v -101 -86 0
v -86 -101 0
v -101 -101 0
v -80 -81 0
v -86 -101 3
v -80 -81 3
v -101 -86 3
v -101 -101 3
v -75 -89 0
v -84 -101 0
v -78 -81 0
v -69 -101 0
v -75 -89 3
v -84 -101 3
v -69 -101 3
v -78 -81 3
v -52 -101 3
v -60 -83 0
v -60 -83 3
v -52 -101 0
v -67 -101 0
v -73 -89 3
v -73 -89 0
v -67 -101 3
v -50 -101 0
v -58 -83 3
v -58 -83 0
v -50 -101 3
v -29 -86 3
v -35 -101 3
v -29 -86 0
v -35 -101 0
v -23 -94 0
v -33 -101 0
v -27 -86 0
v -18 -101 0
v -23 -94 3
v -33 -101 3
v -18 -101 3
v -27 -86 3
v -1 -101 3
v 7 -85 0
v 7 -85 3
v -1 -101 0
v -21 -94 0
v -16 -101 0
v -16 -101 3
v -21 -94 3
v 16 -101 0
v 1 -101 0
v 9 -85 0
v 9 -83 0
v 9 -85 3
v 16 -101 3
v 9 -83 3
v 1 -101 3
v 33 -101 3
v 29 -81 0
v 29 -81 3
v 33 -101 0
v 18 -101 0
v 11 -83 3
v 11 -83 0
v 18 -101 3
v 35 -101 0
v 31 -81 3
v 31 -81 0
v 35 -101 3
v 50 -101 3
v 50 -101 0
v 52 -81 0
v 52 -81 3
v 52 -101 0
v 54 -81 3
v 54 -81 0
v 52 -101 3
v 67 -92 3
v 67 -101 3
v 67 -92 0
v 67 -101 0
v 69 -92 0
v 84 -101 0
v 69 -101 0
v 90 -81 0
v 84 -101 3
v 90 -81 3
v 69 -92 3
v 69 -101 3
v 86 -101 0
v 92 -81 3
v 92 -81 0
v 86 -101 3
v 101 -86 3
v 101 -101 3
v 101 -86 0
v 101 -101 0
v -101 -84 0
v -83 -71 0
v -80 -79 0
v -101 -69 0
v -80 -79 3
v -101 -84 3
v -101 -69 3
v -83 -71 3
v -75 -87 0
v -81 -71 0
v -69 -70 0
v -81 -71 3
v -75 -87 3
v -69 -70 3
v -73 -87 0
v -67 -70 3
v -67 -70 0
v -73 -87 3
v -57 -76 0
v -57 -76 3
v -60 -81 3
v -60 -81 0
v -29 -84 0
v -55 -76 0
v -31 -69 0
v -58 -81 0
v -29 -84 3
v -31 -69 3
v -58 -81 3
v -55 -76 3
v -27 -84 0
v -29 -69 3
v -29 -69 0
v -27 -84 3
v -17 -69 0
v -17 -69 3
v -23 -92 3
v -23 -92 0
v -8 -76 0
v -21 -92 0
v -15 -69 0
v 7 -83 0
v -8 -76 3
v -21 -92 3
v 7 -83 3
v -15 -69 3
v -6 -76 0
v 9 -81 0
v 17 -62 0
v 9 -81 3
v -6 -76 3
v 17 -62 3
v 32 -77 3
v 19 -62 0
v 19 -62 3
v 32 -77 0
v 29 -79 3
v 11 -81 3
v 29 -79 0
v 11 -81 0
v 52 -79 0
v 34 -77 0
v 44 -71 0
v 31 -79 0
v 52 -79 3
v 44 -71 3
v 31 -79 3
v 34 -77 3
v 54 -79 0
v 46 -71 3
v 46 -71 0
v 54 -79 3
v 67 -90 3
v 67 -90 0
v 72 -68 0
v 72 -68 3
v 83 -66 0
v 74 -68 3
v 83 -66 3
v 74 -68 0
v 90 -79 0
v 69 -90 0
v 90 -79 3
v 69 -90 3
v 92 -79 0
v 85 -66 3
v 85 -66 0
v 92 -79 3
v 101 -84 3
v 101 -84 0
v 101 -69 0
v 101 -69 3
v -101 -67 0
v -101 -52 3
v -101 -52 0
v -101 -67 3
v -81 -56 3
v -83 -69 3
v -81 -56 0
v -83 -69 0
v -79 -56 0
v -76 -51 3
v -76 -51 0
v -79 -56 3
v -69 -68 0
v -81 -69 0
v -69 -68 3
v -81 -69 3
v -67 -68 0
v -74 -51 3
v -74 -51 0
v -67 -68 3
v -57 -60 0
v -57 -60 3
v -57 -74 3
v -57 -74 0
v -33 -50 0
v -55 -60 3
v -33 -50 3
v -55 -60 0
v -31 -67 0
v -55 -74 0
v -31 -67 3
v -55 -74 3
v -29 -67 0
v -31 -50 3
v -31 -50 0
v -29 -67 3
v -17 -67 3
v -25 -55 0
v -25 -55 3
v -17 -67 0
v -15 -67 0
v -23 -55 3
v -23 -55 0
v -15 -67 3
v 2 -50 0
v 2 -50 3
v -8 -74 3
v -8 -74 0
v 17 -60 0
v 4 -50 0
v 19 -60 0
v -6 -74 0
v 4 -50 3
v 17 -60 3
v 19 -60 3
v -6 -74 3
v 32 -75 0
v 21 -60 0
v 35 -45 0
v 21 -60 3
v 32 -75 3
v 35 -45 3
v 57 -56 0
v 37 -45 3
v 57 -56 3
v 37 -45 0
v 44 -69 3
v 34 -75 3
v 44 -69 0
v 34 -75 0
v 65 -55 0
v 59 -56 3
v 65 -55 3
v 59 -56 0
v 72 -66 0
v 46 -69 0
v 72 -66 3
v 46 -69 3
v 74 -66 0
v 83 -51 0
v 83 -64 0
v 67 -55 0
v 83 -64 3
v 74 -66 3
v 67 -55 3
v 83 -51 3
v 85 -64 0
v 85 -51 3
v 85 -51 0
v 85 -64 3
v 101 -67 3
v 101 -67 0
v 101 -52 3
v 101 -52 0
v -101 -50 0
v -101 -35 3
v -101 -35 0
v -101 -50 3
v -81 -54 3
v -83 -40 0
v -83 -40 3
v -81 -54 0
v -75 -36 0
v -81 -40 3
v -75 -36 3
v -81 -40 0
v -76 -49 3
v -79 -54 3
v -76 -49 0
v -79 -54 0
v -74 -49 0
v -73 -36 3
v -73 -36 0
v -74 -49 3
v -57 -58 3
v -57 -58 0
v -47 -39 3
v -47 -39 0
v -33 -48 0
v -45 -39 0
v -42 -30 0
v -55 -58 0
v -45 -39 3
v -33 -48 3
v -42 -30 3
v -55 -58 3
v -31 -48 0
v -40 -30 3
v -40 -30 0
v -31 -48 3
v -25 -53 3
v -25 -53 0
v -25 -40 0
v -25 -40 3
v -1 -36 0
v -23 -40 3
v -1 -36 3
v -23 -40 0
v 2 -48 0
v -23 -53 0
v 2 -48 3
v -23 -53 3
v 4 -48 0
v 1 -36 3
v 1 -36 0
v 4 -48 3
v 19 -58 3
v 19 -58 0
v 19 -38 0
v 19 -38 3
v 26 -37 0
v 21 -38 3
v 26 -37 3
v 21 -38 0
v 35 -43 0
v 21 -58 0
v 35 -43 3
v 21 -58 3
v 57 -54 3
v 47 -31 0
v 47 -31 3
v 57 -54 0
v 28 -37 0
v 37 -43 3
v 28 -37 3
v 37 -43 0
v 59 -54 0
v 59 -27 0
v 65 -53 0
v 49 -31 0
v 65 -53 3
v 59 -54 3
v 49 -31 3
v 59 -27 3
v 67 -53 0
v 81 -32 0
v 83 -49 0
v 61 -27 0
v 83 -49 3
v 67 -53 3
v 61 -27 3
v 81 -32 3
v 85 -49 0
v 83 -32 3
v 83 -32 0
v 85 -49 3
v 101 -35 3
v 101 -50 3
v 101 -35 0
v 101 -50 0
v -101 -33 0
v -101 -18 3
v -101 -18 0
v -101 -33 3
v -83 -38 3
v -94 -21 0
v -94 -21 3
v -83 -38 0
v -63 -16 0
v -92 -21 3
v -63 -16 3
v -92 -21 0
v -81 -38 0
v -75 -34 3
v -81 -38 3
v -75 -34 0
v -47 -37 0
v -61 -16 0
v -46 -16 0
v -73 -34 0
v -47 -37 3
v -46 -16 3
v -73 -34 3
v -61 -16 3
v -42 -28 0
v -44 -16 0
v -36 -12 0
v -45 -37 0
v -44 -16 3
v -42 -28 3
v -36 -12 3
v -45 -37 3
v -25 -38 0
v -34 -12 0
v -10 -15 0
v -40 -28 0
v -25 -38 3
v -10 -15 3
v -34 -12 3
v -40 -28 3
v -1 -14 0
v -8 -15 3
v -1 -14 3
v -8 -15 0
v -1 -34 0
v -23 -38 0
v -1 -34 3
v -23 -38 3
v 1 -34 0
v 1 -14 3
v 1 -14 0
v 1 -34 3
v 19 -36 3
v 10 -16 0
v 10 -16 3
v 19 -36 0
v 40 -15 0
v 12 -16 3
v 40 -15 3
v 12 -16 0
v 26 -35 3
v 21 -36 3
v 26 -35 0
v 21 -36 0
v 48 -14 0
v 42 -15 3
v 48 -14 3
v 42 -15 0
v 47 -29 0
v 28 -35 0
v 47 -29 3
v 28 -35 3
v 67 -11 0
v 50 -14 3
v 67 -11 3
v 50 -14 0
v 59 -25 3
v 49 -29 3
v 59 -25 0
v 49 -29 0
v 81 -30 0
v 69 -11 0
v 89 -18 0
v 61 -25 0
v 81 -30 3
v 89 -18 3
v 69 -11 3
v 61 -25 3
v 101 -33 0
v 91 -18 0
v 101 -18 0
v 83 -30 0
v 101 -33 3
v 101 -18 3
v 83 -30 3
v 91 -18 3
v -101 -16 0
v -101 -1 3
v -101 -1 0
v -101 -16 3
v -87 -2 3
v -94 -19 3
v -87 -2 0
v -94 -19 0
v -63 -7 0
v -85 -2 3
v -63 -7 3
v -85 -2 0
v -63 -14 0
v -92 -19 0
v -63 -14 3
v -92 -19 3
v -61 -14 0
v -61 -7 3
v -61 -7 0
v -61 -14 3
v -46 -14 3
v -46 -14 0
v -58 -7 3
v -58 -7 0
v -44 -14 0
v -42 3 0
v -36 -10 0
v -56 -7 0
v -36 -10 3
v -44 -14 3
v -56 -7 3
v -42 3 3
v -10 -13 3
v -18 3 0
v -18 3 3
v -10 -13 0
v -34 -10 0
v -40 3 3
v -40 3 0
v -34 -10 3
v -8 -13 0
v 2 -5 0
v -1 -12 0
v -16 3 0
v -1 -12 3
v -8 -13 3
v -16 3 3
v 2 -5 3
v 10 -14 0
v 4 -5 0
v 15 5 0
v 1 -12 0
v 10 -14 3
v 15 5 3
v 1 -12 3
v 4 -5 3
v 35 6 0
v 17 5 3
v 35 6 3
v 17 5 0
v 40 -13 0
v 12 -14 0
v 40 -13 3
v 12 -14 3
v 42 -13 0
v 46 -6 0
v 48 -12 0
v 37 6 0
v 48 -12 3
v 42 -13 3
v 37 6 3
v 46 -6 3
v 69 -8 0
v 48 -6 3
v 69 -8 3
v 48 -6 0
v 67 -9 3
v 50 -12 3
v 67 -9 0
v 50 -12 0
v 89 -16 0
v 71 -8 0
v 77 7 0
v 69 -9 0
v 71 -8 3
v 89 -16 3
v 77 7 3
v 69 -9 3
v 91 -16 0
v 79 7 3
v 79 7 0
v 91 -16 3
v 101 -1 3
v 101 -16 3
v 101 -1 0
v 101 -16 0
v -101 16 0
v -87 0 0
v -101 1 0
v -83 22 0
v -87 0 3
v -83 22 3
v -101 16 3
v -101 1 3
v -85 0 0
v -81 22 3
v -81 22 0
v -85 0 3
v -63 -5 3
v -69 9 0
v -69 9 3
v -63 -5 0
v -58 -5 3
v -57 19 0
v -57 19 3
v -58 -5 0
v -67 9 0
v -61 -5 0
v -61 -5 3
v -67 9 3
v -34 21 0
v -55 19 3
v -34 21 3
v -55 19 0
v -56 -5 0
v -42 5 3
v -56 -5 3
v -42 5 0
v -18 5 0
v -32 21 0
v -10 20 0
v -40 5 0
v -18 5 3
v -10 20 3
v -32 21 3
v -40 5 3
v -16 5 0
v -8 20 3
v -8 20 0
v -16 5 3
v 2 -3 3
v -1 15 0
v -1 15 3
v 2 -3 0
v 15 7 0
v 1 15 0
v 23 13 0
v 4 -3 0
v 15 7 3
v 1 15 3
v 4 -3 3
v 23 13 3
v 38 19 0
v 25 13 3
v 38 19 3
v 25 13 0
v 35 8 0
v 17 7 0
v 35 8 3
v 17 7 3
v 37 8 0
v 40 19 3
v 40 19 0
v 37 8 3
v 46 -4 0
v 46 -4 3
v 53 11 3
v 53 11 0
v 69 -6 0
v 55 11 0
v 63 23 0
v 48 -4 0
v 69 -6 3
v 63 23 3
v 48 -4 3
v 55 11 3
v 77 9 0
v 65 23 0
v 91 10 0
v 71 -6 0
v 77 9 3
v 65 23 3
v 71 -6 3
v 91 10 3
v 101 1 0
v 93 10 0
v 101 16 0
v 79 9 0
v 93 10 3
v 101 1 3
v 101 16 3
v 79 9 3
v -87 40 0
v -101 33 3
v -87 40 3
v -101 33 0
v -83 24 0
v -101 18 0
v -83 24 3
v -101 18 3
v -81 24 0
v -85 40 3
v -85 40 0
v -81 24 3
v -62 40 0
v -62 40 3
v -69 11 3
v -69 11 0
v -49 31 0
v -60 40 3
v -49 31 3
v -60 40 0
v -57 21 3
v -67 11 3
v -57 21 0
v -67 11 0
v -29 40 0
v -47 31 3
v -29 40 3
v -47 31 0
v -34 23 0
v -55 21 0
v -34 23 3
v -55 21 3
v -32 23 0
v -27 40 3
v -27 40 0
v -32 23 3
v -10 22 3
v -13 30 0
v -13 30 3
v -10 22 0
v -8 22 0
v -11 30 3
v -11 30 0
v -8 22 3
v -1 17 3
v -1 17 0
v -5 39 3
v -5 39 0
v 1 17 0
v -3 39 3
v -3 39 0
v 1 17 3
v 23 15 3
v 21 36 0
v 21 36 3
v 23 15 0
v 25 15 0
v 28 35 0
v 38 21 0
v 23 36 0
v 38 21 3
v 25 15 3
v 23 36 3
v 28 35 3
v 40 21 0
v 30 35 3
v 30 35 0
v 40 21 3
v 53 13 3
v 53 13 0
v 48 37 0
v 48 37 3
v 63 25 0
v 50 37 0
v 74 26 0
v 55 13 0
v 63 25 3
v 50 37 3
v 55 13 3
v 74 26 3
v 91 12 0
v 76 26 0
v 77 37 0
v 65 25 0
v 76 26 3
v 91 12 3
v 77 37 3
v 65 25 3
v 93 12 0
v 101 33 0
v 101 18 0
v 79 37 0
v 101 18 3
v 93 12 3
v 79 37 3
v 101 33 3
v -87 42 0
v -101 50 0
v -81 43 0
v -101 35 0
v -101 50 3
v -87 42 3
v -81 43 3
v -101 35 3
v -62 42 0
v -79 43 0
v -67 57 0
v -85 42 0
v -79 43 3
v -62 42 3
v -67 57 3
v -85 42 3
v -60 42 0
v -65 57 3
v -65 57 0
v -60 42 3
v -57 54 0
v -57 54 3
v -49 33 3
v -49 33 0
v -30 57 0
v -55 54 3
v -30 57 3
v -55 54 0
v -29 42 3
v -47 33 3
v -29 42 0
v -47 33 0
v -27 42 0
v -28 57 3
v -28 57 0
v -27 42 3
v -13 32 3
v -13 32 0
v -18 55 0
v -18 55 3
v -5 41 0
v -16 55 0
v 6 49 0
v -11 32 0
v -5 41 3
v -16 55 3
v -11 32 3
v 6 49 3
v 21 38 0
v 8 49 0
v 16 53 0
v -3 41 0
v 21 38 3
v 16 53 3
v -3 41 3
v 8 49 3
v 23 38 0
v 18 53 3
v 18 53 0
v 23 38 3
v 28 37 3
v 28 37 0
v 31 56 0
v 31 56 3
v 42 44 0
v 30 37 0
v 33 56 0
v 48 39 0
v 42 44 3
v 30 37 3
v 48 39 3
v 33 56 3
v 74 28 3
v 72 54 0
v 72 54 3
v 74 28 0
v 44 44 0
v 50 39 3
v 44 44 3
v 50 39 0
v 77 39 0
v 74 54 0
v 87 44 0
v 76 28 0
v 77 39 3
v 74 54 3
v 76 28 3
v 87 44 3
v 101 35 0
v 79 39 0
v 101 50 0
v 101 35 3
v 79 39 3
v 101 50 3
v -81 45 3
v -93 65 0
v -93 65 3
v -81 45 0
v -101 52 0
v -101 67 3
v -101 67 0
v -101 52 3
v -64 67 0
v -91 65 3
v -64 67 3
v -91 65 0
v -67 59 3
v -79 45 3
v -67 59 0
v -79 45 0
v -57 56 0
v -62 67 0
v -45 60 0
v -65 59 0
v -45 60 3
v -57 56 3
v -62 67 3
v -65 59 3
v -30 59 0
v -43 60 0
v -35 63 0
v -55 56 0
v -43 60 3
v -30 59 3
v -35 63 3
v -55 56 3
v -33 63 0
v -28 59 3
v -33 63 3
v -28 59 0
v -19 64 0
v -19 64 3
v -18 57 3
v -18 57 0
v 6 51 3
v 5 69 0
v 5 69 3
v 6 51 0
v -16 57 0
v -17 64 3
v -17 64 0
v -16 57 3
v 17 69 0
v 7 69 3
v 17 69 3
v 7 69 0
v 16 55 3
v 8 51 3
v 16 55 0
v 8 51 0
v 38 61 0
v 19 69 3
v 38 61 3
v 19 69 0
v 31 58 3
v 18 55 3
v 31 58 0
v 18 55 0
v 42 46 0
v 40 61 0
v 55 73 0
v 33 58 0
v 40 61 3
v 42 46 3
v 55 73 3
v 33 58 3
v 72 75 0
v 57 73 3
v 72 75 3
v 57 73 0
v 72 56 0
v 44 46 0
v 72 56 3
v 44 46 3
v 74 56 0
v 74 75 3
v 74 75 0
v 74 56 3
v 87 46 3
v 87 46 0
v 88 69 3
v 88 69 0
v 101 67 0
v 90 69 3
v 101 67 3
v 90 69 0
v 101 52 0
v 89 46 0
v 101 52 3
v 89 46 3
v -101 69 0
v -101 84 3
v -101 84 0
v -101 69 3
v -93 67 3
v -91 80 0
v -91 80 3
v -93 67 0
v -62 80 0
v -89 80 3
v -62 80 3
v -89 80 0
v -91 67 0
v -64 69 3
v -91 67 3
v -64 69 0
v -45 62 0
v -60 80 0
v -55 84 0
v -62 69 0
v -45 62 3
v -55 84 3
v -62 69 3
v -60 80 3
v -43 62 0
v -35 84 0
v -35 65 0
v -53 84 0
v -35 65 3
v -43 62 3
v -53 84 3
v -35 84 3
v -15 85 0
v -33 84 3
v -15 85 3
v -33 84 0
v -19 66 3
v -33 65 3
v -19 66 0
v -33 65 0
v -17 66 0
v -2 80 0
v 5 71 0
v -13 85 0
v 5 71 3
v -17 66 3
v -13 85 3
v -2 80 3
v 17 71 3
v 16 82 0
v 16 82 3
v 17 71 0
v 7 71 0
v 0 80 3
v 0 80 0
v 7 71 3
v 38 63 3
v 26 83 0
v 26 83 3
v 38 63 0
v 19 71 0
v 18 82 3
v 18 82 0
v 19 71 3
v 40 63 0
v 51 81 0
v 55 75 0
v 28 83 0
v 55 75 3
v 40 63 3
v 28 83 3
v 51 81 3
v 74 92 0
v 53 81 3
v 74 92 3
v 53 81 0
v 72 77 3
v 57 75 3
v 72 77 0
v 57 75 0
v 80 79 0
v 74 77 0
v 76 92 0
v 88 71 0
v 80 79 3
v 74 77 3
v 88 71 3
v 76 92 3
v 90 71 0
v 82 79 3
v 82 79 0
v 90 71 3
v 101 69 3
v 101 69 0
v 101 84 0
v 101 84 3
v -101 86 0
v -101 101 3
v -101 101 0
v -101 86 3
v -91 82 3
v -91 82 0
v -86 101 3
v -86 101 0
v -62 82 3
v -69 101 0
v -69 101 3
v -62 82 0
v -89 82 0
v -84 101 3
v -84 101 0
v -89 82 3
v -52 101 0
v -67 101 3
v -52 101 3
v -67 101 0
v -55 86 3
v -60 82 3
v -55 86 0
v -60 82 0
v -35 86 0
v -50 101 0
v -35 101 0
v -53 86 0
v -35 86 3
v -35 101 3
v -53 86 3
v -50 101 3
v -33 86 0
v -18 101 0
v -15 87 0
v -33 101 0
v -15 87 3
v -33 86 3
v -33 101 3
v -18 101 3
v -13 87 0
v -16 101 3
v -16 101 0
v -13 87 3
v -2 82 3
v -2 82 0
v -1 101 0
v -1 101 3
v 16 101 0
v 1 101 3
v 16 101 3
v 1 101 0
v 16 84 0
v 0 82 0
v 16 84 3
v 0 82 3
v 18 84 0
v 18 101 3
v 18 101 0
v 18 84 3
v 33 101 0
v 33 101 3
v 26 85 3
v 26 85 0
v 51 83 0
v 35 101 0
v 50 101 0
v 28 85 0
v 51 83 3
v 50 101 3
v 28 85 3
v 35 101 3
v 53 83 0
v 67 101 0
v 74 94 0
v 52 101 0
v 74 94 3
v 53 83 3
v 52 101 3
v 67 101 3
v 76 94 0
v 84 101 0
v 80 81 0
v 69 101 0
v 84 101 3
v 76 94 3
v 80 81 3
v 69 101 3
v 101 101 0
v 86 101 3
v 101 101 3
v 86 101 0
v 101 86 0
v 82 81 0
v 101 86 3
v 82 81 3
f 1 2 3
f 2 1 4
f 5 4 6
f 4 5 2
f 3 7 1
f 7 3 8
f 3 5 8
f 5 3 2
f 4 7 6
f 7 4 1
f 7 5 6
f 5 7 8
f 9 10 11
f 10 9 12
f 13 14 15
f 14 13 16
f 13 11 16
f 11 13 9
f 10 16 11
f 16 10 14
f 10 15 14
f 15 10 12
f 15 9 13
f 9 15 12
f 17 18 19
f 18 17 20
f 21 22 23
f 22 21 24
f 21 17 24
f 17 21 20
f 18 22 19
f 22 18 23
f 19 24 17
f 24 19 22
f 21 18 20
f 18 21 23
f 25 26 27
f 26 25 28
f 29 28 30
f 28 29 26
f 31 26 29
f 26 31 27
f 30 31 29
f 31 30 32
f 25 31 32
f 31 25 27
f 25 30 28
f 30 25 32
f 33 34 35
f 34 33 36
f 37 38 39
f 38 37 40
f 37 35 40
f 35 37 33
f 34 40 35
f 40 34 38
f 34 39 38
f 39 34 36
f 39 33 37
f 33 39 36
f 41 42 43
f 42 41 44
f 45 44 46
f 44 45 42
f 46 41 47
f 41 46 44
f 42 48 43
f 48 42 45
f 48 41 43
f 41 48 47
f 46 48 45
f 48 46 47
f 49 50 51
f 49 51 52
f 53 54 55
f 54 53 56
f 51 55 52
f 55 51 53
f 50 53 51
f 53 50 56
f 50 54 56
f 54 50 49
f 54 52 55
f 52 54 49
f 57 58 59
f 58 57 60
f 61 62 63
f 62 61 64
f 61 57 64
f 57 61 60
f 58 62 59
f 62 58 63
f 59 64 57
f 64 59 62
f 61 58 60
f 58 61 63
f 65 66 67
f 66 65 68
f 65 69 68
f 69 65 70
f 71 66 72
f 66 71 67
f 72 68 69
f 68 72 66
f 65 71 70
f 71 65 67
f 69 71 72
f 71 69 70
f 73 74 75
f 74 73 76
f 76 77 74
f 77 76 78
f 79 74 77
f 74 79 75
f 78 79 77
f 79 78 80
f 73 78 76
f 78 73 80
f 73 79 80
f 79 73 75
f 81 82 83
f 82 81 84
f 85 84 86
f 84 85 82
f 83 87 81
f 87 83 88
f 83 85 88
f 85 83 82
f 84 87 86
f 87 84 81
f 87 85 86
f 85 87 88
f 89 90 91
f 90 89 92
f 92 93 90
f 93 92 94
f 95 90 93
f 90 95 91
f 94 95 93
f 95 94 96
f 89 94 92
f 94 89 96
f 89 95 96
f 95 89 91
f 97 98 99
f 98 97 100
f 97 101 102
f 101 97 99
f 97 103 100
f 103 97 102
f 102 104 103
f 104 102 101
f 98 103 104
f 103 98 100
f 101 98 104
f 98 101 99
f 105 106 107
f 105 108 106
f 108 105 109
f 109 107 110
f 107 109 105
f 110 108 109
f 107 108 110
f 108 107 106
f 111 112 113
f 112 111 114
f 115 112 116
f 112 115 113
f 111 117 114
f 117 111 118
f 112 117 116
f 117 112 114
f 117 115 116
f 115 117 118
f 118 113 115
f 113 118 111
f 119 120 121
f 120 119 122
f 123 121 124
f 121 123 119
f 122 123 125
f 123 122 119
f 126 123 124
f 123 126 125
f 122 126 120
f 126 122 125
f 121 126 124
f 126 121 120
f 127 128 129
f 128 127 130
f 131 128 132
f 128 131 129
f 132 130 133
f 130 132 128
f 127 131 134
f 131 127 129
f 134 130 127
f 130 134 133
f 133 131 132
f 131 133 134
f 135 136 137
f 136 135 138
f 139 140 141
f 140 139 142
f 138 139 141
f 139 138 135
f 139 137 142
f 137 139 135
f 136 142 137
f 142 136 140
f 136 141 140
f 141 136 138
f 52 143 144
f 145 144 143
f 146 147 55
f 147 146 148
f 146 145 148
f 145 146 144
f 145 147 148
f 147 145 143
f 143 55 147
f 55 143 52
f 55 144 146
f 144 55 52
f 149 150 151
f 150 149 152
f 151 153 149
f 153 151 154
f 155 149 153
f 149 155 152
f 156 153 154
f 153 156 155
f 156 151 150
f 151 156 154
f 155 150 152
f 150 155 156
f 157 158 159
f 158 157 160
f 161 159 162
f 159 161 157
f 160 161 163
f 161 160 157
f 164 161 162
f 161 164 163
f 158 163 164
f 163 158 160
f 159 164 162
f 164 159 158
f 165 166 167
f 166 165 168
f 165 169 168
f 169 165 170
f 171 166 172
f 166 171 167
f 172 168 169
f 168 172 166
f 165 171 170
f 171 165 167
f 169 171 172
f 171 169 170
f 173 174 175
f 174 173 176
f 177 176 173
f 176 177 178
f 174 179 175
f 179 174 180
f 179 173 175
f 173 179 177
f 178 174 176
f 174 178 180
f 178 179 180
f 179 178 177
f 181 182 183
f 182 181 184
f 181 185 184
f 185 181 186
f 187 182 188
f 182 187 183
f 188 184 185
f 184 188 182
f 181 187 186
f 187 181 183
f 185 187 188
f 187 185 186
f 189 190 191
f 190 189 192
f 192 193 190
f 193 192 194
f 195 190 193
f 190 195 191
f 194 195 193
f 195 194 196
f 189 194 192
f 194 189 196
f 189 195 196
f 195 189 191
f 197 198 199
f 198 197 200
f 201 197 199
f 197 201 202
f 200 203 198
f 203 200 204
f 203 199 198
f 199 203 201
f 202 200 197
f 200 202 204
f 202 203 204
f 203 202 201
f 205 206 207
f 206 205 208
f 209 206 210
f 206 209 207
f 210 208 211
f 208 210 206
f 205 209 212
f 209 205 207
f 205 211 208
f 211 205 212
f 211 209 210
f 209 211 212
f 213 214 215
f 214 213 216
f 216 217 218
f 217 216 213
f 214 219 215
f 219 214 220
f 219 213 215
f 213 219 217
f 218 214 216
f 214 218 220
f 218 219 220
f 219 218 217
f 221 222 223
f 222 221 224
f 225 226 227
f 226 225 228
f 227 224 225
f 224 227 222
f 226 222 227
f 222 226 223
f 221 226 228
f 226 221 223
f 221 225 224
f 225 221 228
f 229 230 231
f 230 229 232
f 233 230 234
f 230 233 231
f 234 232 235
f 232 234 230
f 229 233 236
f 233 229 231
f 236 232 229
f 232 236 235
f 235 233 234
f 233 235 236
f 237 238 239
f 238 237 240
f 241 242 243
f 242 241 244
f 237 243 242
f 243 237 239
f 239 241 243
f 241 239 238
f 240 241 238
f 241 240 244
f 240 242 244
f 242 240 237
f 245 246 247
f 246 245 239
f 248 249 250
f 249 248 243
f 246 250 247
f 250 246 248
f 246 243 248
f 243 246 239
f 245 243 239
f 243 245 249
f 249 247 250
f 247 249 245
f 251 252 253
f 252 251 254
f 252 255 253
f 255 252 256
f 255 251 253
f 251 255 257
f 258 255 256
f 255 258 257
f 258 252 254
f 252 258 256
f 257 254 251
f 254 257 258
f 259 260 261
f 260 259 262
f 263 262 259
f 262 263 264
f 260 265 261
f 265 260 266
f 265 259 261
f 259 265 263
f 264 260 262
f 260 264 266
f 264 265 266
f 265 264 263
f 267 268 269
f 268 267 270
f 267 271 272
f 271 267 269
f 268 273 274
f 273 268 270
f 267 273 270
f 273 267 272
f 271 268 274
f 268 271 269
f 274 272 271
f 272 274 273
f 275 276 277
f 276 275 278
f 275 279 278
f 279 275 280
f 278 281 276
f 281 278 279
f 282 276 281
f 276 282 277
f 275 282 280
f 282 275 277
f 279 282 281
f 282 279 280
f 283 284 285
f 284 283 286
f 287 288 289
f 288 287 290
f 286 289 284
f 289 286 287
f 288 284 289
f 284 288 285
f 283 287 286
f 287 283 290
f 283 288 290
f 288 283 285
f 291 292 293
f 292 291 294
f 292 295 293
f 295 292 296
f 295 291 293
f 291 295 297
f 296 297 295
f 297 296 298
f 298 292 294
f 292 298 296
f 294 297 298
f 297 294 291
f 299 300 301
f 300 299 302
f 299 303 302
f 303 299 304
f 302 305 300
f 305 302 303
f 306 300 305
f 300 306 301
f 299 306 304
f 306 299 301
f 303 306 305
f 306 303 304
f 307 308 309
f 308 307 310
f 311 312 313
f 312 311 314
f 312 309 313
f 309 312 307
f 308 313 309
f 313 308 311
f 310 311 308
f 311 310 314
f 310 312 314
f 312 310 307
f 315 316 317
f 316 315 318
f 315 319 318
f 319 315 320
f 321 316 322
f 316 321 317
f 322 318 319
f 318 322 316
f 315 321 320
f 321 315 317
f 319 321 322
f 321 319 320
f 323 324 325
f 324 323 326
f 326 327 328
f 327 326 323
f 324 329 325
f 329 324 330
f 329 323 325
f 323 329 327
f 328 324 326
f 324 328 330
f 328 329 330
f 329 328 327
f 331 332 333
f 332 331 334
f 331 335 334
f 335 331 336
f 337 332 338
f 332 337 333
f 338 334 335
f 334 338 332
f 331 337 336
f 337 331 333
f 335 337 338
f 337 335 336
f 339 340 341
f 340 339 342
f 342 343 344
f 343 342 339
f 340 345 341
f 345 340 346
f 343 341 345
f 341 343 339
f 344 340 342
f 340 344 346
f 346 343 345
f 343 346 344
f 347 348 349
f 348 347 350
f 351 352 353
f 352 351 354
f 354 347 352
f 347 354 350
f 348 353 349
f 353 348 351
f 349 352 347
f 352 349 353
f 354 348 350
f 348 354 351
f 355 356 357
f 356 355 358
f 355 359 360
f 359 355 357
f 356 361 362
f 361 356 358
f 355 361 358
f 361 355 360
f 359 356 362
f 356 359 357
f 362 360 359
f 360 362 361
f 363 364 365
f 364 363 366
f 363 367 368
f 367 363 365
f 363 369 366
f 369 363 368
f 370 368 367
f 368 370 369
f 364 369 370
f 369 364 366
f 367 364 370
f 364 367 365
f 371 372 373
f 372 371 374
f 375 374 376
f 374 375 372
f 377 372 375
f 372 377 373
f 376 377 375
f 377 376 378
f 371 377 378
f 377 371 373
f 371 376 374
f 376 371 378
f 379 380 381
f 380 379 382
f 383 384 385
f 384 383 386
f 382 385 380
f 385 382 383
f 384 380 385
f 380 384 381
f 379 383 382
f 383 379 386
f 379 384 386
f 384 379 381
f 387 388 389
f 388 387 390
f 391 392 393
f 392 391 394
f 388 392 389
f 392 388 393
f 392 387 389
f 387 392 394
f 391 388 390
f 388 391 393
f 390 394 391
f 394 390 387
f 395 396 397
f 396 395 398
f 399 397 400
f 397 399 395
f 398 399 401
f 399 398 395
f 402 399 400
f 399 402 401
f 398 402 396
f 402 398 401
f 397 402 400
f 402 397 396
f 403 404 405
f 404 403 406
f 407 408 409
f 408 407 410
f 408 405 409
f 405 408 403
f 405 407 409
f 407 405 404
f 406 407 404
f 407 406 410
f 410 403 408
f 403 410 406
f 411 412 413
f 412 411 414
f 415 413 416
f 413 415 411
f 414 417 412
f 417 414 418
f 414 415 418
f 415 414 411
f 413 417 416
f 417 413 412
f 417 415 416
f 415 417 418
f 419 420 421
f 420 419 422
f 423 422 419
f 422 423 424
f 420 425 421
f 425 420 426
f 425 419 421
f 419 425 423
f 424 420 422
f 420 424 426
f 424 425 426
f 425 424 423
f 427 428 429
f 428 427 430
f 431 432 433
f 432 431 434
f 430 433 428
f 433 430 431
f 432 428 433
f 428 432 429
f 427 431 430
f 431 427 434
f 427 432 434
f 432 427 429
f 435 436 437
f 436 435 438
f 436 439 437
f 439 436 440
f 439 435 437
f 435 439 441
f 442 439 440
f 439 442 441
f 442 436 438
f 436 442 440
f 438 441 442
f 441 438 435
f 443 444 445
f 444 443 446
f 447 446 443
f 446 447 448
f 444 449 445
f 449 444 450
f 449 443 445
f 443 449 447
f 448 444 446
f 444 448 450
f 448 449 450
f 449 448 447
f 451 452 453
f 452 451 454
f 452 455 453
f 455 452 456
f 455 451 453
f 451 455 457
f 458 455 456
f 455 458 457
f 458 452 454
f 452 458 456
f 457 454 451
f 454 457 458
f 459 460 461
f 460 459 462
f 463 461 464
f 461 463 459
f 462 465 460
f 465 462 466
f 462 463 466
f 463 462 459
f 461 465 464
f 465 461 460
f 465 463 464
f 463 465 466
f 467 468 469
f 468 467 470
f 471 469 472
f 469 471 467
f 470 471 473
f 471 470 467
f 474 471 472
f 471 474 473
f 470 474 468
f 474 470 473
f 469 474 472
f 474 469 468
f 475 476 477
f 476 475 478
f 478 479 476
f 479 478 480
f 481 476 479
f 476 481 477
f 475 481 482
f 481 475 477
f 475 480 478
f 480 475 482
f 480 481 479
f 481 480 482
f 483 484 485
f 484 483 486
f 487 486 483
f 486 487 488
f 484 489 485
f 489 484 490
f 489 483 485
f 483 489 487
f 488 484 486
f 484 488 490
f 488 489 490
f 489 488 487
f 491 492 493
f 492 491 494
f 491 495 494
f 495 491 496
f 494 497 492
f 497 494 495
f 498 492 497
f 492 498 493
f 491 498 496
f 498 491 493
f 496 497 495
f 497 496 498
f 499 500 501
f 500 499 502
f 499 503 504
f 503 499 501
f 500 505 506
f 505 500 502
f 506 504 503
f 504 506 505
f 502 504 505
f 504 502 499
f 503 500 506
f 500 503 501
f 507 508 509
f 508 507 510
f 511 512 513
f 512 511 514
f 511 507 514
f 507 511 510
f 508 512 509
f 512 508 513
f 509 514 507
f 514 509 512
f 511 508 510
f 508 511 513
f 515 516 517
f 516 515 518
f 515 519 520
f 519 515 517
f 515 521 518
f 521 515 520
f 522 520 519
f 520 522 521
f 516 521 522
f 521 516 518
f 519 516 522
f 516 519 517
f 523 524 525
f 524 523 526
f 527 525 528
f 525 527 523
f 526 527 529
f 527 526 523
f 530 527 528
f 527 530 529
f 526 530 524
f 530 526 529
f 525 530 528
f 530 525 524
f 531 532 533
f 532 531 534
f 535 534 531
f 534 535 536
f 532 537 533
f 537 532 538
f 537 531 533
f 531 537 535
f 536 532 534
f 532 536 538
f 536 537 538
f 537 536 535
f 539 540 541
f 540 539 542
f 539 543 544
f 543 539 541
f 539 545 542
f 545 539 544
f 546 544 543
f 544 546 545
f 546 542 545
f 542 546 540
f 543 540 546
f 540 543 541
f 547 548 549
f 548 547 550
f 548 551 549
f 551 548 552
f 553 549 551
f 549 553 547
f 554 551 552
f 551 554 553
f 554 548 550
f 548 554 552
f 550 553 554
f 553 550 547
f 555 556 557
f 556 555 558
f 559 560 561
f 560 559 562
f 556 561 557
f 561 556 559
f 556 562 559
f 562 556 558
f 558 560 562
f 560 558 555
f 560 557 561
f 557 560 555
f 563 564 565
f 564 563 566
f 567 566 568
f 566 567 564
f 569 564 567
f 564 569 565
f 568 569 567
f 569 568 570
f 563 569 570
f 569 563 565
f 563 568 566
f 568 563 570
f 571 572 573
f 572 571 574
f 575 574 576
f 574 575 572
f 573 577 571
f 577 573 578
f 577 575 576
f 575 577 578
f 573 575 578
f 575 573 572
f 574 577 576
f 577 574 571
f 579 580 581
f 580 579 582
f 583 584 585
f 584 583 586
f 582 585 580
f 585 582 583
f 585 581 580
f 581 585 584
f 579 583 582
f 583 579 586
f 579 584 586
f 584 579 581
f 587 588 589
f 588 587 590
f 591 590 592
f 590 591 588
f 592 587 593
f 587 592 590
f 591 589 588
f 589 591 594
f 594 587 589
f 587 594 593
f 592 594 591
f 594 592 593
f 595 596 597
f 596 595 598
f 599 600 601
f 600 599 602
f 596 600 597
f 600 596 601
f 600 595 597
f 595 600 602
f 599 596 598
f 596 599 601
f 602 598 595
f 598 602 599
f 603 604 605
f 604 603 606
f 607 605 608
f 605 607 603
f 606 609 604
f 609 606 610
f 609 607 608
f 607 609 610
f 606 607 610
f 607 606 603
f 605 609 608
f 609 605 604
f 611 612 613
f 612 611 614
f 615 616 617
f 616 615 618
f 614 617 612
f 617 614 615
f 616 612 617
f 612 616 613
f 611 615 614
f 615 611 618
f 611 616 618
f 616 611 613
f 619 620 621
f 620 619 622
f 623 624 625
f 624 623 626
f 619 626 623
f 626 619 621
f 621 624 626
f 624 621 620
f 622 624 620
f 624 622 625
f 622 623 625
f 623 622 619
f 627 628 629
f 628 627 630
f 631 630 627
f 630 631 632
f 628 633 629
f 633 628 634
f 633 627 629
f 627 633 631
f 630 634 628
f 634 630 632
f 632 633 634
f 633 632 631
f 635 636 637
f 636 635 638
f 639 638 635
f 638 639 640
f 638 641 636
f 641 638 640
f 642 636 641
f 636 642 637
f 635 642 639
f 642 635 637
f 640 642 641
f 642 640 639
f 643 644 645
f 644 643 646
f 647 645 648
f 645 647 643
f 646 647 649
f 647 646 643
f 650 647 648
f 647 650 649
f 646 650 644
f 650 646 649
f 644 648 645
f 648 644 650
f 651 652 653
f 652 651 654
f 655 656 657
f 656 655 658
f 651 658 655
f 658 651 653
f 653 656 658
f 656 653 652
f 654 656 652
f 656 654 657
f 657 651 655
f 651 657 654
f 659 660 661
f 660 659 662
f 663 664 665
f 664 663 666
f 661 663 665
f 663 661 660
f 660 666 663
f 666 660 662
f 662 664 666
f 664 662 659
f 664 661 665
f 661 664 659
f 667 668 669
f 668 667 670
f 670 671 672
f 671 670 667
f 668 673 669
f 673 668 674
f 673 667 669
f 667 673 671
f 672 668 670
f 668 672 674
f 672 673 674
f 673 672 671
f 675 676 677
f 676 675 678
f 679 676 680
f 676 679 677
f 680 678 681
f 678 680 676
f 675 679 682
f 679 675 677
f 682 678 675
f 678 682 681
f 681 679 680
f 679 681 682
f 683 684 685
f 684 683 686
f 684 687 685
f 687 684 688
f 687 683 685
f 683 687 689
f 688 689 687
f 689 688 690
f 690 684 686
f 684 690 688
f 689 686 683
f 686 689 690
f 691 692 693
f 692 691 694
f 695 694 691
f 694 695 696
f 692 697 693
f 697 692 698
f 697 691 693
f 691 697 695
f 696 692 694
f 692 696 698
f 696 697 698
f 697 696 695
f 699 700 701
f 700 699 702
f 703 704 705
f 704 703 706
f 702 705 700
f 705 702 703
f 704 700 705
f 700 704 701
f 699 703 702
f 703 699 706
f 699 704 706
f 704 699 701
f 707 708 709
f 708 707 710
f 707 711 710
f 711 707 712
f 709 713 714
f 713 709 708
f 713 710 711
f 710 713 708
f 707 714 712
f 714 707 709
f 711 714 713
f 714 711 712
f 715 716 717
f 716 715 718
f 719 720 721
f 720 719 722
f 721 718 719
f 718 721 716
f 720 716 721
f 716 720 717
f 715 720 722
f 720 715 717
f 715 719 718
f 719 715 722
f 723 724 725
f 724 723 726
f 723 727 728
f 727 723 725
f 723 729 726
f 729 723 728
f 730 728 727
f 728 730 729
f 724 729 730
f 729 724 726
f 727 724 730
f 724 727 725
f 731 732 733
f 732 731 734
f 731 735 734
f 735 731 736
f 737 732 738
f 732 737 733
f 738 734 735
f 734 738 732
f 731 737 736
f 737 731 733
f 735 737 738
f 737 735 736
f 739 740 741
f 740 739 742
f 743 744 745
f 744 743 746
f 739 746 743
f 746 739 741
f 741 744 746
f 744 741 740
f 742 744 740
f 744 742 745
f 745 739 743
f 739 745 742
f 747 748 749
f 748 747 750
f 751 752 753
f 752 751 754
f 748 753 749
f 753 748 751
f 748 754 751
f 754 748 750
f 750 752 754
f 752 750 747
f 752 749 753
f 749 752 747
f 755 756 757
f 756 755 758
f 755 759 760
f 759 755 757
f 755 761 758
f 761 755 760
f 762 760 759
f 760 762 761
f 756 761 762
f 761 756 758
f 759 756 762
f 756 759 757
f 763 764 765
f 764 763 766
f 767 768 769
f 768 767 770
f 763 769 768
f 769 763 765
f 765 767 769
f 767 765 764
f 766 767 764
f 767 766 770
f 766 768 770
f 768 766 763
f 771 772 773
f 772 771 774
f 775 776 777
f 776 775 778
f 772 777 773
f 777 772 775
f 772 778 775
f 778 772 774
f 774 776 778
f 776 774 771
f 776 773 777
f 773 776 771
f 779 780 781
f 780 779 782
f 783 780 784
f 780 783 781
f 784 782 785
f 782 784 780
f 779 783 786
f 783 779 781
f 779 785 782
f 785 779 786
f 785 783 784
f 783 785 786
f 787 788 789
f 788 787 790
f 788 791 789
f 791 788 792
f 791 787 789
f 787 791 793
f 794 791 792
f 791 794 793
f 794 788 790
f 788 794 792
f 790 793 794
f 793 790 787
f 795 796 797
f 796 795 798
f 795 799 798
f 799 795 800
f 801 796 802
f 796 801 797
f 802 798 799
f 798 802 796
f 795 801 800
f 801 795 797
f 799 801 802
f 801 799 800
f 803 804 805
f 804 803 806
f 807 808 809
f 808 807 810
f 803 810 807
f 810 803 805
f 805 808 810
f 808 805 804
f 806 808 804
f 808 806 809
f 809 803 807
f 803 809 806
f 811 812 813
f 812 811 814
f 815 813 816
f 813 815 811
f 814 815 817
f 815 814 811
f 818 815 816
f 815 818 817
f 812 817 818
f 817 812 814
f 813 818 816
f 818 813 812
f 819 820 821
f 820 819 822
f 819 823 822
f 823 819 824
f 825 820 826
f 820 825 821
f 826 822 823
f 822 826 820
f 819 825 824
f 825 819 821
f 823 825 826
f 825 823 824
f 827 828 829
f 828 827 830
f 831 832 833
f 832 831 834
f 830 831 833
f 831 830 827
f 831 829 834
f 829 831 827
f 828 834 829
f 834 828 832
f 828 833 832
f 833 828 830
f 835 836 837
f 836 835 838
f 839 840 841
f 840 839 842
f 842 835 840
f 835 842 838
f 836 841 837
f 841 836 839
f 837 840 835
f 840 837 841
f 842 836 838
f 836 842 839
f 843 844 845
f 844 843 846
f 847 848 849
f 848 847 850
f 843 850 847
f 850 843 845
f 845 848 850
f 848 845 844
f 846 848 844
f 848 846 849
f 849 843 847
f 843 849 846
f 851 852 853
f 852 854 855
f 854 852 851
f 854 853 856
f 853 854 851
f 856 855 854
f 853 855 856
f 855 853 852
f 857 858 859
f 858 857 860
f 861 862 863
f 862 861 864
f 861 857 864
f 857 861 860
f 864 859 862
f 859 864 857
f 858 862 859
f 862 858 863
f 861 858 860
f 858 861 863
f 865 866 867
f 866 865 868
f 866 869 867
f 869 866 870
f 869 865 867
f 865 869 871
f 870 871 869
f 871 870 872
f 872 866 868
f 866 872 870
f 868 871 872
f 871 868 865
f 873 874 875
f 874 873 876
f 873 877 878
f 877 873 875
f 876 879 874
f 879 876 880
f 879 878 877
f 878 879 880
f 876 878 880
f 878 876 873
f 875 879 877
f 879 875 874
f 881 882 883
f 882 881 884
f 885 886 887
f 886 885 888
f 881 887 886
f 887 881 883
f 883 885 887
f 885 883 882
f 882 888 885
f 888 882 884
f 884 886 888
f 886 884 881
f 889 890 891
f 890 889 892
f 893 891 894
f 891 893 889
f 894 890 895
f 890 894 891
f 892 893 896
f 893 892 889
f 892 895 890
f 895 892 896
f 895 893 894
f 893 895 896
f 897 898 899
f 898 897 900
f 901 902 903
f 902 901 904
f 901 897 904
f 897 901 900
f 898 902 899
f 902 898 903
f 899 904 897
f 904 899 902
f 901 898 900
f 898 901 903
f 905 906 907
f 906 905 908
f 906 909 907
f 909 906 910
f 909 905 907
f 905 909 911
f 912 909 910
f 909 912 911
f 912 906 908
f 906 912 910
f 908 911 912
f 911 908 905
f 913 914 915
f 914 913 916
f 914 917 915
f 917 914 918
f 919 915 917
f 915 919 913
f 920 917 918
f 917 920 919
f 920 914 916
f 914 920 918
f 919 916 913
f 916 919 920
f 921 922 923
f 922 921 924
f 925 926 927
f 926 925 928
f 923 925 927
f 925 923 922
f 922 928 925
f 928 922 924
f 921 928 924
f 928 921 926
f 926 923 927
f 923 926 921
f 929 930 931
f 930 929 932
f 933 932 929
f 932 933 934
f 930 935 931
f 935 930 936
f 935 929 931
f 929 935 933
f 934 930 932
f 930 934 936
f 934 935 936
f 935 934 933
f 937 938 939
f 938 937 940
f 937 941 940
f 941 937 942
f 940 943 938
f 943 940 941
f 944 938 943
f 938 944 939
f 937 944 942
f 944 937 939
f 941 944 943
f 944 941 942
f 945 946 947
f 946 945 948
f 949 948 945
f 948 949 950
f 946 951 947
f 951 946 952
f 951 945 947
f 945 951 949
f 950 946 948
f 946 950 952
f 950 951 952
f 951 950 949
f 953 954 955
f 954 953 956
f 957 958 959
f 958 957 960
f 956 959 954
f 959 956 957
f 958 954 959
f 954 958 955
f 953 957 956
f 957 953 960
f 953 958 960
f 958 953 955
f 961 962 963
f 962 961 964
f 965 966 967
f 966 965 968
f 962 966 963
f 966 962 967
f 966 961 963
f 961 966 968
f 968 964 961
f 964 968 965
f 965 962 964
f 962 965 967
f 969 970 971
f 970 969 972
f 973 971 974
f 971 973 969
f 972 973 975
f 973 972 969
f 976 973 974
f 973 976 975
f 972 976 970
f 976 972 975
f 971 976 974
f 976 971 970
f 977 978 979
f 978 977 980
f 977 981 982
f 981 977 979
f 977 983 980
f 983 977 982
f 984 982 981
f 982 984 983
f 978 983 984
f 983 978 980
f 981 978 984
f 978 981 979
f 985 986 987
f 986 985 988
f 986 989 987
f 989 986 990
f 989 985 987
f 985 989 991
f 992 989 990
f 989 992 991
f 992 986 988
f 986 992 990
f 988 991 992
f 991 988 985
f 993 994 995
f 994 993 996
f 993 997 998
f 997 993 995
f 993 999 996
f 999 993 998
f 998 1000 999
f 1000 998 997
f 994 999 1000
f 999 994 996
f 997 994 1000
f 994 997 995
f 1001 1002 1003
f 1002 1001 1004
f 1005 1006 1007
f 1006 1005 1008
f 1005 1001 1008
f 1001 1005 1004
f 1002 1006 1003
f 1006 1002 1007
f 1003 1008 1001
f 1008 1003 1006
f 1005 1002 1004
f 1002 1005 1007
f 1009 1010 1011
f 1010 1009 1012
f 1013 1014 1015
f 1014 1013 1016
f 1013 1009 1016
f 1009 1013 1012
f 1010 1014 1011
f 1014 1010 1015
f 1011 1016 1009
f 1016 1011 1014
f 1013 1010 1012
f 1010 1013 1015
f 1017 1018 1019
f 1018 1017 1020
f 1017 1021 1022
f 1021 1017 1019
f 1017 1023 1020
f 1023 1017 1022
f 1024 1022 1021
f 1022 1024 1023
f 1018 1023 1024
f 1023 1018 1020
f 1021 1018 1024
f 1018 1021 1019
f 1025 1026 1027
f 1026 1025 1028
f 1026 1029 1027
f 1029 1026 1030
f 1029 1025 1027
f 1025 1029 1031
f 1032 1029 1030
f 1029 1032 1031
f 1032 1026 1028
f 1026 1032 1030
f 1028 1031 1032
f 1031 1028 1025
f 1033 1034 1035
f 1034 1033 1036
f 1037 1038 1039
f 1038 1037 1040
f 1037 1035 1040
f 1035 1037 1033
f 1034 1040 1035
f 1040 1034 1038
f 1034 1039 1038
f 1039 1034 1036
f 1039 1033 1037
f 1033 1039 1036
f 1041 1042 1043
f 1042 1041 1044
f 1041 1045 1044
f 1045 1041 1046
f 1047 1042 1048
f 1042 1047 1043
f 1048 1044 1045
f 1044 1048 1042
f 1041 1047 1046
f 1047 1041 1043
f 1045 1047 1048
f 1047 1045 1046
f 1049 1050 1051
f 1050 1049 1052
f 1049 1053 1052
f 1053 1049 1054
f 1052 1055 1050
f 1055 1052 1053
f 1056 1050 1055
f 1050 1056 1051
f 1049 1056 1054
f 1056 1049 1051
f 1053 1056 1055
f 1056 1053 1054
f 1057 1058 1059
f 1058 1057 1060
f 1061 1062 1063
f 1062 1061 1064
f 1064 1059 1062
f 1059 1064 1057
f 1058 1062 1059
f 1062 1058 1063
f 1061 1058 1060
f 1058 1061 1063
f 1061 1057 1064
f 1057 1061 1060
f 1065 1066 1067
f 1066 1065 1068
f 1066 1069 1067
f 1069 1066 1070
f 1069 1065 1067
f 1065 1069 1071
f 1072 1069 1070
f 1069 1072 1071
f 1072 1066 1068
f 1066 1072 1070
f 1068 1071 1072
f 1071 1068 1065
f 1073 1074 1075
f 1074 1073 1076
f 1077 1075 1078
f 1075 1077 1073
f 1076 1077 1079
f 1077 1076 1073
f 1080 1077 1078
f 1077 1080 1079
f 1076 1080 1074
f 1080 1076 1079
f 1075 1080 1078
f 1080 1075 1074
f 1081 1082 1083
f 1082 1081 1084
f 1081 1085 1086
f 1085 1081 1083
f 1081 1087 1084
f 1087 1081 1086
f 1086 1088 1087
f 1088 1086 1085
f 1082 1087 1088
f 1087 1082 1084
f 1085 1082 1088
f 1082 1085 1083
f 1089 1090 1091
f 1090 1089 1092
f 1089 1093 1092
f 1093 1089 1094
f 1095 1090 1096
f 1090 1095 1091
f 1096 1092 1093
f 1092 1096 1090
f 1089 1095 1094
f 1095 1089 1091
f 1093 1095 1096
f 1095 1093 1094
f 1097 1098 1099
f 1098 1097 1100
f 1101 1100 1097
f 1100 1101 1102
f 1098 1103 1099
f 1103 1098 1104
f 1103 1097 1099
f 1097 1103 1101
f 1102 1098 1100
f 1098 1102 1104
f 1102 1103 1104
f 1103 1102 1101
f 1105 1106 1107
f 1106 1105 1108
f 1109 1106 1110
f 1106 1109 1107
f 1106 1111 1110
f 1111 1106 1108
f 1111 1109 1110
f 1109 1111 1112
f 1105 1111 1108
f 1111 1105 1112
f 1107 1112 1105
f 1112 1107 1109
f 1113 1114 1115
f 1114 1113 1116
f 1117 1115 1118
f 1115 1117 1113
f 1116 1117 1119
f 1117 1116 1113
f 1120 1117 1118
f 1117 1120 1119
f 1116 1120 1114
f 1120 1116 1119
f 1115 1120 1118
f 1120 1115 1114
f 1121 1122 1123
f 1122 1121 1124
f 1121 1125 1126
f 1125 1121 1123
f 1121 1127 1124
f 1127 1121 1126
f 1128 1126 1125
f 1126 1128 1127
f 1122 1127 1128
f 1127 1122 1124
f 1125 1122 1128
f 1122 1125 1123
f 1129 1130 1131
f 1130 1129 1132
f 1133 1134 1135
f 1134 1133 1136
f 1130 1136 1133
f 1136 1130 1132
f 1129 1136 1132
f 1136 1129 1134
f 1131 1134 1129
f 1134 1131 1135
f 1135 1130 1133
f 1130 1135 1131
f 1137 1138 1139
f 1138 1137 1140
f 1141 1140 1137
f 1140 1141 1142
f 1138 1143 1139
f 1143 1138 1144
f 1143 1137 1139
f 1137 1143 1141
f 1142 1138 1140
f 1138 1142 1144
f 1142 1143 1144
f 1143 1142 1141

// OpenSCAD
/* quads.scad -
 *
 * Some quadrilaterals that are perturbed rectangles, there are lots of settings
 * and options.
 *
 * HeightMode - Method used to set height of each quad, and must be one of:
 *
 *				HM_FIXED- All quads are the same height, BaseHeight.
 *
 *				HM_RANDOM - Each quad is BaseHeight + one of Heights
 *							random values, stepped by HeightInc.
 *
 * QuadType - Type of each quad, and must be one of:
 *
 *			  QT_VERT - Polygon with vertical sides.
 *
 *			  QT_TAPER - Polygon with tapered sides.
 *
 *			  QT_TOPO - Polyhedrons that meet at the edges, works best when
 *						HeightMode is HM_RANDOM.
 */

/*
 * Each x in the G grid is a point that will be perturbed (in x and y) 
 * to make slightly irregular quadrilaterals. The edges remain untouched
 * to create a rectangle.
  *
 *   0   1   2   3   4   5   6   7   8
 * 0 +---+---+---+---+---+---+---+---+
 *   | A |   |   |   |   |   |   |   |
 * 1 +---x---x---x---x---x---x---x---+
 *   |   |   |   |   |   |   |   |   |
 * 2 +---x---x---x---x---x---x---x---+
 *   |   |   |   |   |   |   |   |   |
 * 3 +---x---x---x---x---x---x---x---+
 *   |   |   |   |   |   |   |   |   |
 * 4 +---+---+---+---+---+---+---+---+
 *
 * A is the first rectangle (defined by the points around it, and so forth.
 *
 * The H grid is used only when QuadType is QT_TOPO, and has the same basic
 * layout as the G grid. Each x in the grid represents the height of the
 * polyhedron where the adjacent quadrilaterals meet. Each element of the
 * H grid is a height value.
 */
 
/* 
 * Define the grid:
 */
 
// Number of rows in the grid 
Rows = 12;
// Number of columns in the grid 
Cols = 12;

/* 
 * Define size of each rectangle in the grid:
 */

// Width of each rectangle
RectWidth = 15;
// Depth of each rectangle
RectDepth = 15;

/* 
 * Define gap between rectangles:
 */

// Gap between each row of rectangles
RectRowGap = 2;
// Gap between each column of rectangles
RectColGap = 2;

/* 
 * Define amount of perturbation per rectangle, this is -/+, so the 
 * perturbation can be from (-RowPert) to (RowPert), and the same 
 * for ColPert. 
 */
 
// Max perturbation between rows
RowPert = 8;
// Max perturbation between columns
ColPert = 8;

/* 
 * Set height mode:
 */
 
// Height mode
HeightMode = "HM_FIXED"; // [HM_FIXED, HM_RANDOM]

/*
 * Define height parameters:
*/

// Base height
BaseHeight = 3;		// [0.2 : 10]
// Height increment
HeightInc  = 0.4; 	// [0.2 : 0.2 : 10]
// Number of random heights
Heights    = 7;		// [1 : 20]

/* 
 * Set quad type:
 */
 
// Quad type
QuadType = "QT_VERT"; // [QT_VERT, QT_TAPER, QT_TOPO]

/* End of customization */
module __Customizer_Limit__ () {}

/* Perform sanity checks */
assert(Rows > 0);
assert(Cols > 0);
assert(RectWidth > 0);
assert(RectDepth > 0);
assert(RectRowGap >= 0);
assert(RectColGap >= 0);
assert(RowPert >= 0);
assert(ColPert >= 0);
assert((HeightMode == "HM_FIXED") || (HeightMode == "HM_RANDOM"));
assert((QuadType == "QT_VERT") || (QuadType == "QT_TAPER") || (QuadType == "QT_TOPO"));

/* Seed the RNG */
X = rands(0, 100, 1, 131313);

/* Rotate around Z */
cur_vpr = $vpr;
$vpr = [cur_vpr[0], cur_vpr[1], 360 * $t];

/* Compute overall size */
Width = (Cols * RectWidth) + ((Cols - 1) * RectColGap);
Depth = (Cols * RectDepth) + ((Rows - 1) * RectRowGap);

echo ("Overall size: ", Width, Depth);

/* Build the G grid */
G = 
[
	[for (c = [0 : Cols]) [ 0, 0]],
		
	for (r = [1 : Rows - 1]) 
		[
			[0, 0],
			for (c = [1 : Cols - 1]) [
				round(rands(-RowPert, RowPert, 1)[0]), 
				round(rands(-ColPert, ColPert, 1)[0])],
			[0, 0]				
		],
			
	[for (c = [0 : Cols]) [ 0, 0]],
];

echo("G Grid:");
for (r = [0 : Rows])
{
	echo("  Row: ", r);
	echo("    ", G[r], "\n");
}

/* Build the H grid */
H =
[
	[for (c = [0 : Cols]) BaseHeight],
		
	for (r = [1 : Rows - 1]) 
		[	
			BaseHeight,
			for (c = [1 : Cols - 1]) BaseHeight + floor(rands(0, Heights, 1)[0]) * HeightInc,
			BaseHeight				
		],	
		
	[for (c = [0 : Cols]) BaseHeight],
];
	
echo("H Grid:");
for (r = [0 : Rows])
{
	echo("  Row: ", r);
	echo("    ", H[r], "\n");
}
	
/*
 * Names of the X_BL (Bottom Left) define the four corners of the rectangle:
 *
 *	  [X_TL, Y_TL]       [X_TR, Y_TR]
 *    +-------------...-------------+
 *    |                             |
 *    .                             .
 *    |                             |
 *    +-------------...-------------+
 *	  [X_BL, Y_BL]       [X_BR, Y_BR]
 *
 * These values are then perturbed via the G grid to define the corners of the
 * quadrilateral, with names suffixed by _G.
 */

translate([-Width / 2, -Depth / 2, 0])
/* Construct polygons */
for (r = [0 : Rows - 1])
{
	for (c = [0 : Cols - 1])
	{ 
		/* Compute coordinates of each rectangle */
		X_BL = (c * (RectWidth + RectColGap)); 
		X_BR = X_BL + RectWidth;
		X_TL = X_BL;
		X_TR = X_BR;
	
		Y_BL = (r * (RectDepth + RectRowGap)); 
		Y_TL = Y_BL + RectDepth;
		Y_BR = Y_BL;
		Y_TR = Y_TL;
	
		/* Adjust by the per-corner perturbation in the grid */
		X_BL_G = X_BL + G[r][c][1];
		Y_BL_G = Y_BL + G[r][c][0];

		X_BR_G = X_BR + G[r][c+1][1];
		Y_BR_G = Y_BR + G[r][c+1][0];
	
		X_TL_G = X_TL + G[r+1][c][1];
		Y_TL_G = Y_TL + G[r+1][c][0];

		X_TR_G = X_TR + G[r+1][c+1][1];
		Y_TR_G = Y_TR + G[r+1][c+1][0];		
	
		/* Pick a height based on HeightMode (this value is not used for QT_TOPO, since each corner has a distinct height) */
		Height =
			(HeightMode == "HM_FIXED")  ? BaseHeight :
			(HeightMode == "HM_RANDOM") ? BaseHeight + floor(rands(0, Heights, 1)[0]) * HeightInc :
			0;
		
		/* Generate quad based on QuadType */
		if (QuadType == "QT_VERT")
		{
			linear_extrude(Height)
				polygon([[X_BL_G, Y_BL_G], [X_BR_G, Y_BR_G], 
						 [X_TR_G, Y_TR_G], [X_TL_G, Y_TL_G]]);
		}
		else 
		if (QuadType == "QT_TAPER")
		{
			X_Center = X_BL + RectWidth / 2;
			Y_Center = Y_BL + RectDepth / 2;
			
			translate([X_Center, Y_Center, 0])
				linear_extrude(Height, scale=0.5)
					translate([-X_Center, -Y_Center, 0])
						polygon([[X_BL_G, Y_BL_G], [X_BR_G, Y_BR_G], 
								 [X_TR_G, Y_TR_G], [X_TL_G, Y_TL_G]]);
		}
		else if (QuadType == "QT_TOPO")
		{
			/* Get height of each corner */
			Z_BL = H[r][c];
			Z_BR = H[r][c+1];
			Z_TL = H[r+1][c];
			Z_TR = H[r+1][c+1];
			
			echo("[", r, ", ", c, "]: ", Z_TL, ", ", Z_TR, ", ", Z_BL, ", ", Z_BR);
			
			/* Create points for polyhedron */
			PolyPoints = 
			[
				[X_BL_G, Y_BL_G, 0],		// 0
				[X_BR_G, Y_BR_G, 0],		// 1
				[X_TR_G, Y_TR_G, 0],		// 2
				[X_TL_G, Y_TL_G, 0],		// 3
				[X_BL_G, Y_BL_G, Z_BL],		// 4
				[X_BR_G, Y_BR_G, Z_BR],		// 5
				[X_TR_G, Y_TR_G, Z_TR],		// 6
				[X_TL_G, Y_TL_G, Z_TL],		// 7
			];
			
			/* Create polyhedron */
			PolyFaces =
			[  
				[0,1,2,3],  // bottom
				[4,5,1,0],  // front
				[7,6,5,4],  // top
				[5,6,2,1],  // right
				[6,7,3,2],  // back
				[7,4,0,3]	// left
			];

			polyhedron(points=PolyPoints,faces=PolyFaces);
		}
	}
}
